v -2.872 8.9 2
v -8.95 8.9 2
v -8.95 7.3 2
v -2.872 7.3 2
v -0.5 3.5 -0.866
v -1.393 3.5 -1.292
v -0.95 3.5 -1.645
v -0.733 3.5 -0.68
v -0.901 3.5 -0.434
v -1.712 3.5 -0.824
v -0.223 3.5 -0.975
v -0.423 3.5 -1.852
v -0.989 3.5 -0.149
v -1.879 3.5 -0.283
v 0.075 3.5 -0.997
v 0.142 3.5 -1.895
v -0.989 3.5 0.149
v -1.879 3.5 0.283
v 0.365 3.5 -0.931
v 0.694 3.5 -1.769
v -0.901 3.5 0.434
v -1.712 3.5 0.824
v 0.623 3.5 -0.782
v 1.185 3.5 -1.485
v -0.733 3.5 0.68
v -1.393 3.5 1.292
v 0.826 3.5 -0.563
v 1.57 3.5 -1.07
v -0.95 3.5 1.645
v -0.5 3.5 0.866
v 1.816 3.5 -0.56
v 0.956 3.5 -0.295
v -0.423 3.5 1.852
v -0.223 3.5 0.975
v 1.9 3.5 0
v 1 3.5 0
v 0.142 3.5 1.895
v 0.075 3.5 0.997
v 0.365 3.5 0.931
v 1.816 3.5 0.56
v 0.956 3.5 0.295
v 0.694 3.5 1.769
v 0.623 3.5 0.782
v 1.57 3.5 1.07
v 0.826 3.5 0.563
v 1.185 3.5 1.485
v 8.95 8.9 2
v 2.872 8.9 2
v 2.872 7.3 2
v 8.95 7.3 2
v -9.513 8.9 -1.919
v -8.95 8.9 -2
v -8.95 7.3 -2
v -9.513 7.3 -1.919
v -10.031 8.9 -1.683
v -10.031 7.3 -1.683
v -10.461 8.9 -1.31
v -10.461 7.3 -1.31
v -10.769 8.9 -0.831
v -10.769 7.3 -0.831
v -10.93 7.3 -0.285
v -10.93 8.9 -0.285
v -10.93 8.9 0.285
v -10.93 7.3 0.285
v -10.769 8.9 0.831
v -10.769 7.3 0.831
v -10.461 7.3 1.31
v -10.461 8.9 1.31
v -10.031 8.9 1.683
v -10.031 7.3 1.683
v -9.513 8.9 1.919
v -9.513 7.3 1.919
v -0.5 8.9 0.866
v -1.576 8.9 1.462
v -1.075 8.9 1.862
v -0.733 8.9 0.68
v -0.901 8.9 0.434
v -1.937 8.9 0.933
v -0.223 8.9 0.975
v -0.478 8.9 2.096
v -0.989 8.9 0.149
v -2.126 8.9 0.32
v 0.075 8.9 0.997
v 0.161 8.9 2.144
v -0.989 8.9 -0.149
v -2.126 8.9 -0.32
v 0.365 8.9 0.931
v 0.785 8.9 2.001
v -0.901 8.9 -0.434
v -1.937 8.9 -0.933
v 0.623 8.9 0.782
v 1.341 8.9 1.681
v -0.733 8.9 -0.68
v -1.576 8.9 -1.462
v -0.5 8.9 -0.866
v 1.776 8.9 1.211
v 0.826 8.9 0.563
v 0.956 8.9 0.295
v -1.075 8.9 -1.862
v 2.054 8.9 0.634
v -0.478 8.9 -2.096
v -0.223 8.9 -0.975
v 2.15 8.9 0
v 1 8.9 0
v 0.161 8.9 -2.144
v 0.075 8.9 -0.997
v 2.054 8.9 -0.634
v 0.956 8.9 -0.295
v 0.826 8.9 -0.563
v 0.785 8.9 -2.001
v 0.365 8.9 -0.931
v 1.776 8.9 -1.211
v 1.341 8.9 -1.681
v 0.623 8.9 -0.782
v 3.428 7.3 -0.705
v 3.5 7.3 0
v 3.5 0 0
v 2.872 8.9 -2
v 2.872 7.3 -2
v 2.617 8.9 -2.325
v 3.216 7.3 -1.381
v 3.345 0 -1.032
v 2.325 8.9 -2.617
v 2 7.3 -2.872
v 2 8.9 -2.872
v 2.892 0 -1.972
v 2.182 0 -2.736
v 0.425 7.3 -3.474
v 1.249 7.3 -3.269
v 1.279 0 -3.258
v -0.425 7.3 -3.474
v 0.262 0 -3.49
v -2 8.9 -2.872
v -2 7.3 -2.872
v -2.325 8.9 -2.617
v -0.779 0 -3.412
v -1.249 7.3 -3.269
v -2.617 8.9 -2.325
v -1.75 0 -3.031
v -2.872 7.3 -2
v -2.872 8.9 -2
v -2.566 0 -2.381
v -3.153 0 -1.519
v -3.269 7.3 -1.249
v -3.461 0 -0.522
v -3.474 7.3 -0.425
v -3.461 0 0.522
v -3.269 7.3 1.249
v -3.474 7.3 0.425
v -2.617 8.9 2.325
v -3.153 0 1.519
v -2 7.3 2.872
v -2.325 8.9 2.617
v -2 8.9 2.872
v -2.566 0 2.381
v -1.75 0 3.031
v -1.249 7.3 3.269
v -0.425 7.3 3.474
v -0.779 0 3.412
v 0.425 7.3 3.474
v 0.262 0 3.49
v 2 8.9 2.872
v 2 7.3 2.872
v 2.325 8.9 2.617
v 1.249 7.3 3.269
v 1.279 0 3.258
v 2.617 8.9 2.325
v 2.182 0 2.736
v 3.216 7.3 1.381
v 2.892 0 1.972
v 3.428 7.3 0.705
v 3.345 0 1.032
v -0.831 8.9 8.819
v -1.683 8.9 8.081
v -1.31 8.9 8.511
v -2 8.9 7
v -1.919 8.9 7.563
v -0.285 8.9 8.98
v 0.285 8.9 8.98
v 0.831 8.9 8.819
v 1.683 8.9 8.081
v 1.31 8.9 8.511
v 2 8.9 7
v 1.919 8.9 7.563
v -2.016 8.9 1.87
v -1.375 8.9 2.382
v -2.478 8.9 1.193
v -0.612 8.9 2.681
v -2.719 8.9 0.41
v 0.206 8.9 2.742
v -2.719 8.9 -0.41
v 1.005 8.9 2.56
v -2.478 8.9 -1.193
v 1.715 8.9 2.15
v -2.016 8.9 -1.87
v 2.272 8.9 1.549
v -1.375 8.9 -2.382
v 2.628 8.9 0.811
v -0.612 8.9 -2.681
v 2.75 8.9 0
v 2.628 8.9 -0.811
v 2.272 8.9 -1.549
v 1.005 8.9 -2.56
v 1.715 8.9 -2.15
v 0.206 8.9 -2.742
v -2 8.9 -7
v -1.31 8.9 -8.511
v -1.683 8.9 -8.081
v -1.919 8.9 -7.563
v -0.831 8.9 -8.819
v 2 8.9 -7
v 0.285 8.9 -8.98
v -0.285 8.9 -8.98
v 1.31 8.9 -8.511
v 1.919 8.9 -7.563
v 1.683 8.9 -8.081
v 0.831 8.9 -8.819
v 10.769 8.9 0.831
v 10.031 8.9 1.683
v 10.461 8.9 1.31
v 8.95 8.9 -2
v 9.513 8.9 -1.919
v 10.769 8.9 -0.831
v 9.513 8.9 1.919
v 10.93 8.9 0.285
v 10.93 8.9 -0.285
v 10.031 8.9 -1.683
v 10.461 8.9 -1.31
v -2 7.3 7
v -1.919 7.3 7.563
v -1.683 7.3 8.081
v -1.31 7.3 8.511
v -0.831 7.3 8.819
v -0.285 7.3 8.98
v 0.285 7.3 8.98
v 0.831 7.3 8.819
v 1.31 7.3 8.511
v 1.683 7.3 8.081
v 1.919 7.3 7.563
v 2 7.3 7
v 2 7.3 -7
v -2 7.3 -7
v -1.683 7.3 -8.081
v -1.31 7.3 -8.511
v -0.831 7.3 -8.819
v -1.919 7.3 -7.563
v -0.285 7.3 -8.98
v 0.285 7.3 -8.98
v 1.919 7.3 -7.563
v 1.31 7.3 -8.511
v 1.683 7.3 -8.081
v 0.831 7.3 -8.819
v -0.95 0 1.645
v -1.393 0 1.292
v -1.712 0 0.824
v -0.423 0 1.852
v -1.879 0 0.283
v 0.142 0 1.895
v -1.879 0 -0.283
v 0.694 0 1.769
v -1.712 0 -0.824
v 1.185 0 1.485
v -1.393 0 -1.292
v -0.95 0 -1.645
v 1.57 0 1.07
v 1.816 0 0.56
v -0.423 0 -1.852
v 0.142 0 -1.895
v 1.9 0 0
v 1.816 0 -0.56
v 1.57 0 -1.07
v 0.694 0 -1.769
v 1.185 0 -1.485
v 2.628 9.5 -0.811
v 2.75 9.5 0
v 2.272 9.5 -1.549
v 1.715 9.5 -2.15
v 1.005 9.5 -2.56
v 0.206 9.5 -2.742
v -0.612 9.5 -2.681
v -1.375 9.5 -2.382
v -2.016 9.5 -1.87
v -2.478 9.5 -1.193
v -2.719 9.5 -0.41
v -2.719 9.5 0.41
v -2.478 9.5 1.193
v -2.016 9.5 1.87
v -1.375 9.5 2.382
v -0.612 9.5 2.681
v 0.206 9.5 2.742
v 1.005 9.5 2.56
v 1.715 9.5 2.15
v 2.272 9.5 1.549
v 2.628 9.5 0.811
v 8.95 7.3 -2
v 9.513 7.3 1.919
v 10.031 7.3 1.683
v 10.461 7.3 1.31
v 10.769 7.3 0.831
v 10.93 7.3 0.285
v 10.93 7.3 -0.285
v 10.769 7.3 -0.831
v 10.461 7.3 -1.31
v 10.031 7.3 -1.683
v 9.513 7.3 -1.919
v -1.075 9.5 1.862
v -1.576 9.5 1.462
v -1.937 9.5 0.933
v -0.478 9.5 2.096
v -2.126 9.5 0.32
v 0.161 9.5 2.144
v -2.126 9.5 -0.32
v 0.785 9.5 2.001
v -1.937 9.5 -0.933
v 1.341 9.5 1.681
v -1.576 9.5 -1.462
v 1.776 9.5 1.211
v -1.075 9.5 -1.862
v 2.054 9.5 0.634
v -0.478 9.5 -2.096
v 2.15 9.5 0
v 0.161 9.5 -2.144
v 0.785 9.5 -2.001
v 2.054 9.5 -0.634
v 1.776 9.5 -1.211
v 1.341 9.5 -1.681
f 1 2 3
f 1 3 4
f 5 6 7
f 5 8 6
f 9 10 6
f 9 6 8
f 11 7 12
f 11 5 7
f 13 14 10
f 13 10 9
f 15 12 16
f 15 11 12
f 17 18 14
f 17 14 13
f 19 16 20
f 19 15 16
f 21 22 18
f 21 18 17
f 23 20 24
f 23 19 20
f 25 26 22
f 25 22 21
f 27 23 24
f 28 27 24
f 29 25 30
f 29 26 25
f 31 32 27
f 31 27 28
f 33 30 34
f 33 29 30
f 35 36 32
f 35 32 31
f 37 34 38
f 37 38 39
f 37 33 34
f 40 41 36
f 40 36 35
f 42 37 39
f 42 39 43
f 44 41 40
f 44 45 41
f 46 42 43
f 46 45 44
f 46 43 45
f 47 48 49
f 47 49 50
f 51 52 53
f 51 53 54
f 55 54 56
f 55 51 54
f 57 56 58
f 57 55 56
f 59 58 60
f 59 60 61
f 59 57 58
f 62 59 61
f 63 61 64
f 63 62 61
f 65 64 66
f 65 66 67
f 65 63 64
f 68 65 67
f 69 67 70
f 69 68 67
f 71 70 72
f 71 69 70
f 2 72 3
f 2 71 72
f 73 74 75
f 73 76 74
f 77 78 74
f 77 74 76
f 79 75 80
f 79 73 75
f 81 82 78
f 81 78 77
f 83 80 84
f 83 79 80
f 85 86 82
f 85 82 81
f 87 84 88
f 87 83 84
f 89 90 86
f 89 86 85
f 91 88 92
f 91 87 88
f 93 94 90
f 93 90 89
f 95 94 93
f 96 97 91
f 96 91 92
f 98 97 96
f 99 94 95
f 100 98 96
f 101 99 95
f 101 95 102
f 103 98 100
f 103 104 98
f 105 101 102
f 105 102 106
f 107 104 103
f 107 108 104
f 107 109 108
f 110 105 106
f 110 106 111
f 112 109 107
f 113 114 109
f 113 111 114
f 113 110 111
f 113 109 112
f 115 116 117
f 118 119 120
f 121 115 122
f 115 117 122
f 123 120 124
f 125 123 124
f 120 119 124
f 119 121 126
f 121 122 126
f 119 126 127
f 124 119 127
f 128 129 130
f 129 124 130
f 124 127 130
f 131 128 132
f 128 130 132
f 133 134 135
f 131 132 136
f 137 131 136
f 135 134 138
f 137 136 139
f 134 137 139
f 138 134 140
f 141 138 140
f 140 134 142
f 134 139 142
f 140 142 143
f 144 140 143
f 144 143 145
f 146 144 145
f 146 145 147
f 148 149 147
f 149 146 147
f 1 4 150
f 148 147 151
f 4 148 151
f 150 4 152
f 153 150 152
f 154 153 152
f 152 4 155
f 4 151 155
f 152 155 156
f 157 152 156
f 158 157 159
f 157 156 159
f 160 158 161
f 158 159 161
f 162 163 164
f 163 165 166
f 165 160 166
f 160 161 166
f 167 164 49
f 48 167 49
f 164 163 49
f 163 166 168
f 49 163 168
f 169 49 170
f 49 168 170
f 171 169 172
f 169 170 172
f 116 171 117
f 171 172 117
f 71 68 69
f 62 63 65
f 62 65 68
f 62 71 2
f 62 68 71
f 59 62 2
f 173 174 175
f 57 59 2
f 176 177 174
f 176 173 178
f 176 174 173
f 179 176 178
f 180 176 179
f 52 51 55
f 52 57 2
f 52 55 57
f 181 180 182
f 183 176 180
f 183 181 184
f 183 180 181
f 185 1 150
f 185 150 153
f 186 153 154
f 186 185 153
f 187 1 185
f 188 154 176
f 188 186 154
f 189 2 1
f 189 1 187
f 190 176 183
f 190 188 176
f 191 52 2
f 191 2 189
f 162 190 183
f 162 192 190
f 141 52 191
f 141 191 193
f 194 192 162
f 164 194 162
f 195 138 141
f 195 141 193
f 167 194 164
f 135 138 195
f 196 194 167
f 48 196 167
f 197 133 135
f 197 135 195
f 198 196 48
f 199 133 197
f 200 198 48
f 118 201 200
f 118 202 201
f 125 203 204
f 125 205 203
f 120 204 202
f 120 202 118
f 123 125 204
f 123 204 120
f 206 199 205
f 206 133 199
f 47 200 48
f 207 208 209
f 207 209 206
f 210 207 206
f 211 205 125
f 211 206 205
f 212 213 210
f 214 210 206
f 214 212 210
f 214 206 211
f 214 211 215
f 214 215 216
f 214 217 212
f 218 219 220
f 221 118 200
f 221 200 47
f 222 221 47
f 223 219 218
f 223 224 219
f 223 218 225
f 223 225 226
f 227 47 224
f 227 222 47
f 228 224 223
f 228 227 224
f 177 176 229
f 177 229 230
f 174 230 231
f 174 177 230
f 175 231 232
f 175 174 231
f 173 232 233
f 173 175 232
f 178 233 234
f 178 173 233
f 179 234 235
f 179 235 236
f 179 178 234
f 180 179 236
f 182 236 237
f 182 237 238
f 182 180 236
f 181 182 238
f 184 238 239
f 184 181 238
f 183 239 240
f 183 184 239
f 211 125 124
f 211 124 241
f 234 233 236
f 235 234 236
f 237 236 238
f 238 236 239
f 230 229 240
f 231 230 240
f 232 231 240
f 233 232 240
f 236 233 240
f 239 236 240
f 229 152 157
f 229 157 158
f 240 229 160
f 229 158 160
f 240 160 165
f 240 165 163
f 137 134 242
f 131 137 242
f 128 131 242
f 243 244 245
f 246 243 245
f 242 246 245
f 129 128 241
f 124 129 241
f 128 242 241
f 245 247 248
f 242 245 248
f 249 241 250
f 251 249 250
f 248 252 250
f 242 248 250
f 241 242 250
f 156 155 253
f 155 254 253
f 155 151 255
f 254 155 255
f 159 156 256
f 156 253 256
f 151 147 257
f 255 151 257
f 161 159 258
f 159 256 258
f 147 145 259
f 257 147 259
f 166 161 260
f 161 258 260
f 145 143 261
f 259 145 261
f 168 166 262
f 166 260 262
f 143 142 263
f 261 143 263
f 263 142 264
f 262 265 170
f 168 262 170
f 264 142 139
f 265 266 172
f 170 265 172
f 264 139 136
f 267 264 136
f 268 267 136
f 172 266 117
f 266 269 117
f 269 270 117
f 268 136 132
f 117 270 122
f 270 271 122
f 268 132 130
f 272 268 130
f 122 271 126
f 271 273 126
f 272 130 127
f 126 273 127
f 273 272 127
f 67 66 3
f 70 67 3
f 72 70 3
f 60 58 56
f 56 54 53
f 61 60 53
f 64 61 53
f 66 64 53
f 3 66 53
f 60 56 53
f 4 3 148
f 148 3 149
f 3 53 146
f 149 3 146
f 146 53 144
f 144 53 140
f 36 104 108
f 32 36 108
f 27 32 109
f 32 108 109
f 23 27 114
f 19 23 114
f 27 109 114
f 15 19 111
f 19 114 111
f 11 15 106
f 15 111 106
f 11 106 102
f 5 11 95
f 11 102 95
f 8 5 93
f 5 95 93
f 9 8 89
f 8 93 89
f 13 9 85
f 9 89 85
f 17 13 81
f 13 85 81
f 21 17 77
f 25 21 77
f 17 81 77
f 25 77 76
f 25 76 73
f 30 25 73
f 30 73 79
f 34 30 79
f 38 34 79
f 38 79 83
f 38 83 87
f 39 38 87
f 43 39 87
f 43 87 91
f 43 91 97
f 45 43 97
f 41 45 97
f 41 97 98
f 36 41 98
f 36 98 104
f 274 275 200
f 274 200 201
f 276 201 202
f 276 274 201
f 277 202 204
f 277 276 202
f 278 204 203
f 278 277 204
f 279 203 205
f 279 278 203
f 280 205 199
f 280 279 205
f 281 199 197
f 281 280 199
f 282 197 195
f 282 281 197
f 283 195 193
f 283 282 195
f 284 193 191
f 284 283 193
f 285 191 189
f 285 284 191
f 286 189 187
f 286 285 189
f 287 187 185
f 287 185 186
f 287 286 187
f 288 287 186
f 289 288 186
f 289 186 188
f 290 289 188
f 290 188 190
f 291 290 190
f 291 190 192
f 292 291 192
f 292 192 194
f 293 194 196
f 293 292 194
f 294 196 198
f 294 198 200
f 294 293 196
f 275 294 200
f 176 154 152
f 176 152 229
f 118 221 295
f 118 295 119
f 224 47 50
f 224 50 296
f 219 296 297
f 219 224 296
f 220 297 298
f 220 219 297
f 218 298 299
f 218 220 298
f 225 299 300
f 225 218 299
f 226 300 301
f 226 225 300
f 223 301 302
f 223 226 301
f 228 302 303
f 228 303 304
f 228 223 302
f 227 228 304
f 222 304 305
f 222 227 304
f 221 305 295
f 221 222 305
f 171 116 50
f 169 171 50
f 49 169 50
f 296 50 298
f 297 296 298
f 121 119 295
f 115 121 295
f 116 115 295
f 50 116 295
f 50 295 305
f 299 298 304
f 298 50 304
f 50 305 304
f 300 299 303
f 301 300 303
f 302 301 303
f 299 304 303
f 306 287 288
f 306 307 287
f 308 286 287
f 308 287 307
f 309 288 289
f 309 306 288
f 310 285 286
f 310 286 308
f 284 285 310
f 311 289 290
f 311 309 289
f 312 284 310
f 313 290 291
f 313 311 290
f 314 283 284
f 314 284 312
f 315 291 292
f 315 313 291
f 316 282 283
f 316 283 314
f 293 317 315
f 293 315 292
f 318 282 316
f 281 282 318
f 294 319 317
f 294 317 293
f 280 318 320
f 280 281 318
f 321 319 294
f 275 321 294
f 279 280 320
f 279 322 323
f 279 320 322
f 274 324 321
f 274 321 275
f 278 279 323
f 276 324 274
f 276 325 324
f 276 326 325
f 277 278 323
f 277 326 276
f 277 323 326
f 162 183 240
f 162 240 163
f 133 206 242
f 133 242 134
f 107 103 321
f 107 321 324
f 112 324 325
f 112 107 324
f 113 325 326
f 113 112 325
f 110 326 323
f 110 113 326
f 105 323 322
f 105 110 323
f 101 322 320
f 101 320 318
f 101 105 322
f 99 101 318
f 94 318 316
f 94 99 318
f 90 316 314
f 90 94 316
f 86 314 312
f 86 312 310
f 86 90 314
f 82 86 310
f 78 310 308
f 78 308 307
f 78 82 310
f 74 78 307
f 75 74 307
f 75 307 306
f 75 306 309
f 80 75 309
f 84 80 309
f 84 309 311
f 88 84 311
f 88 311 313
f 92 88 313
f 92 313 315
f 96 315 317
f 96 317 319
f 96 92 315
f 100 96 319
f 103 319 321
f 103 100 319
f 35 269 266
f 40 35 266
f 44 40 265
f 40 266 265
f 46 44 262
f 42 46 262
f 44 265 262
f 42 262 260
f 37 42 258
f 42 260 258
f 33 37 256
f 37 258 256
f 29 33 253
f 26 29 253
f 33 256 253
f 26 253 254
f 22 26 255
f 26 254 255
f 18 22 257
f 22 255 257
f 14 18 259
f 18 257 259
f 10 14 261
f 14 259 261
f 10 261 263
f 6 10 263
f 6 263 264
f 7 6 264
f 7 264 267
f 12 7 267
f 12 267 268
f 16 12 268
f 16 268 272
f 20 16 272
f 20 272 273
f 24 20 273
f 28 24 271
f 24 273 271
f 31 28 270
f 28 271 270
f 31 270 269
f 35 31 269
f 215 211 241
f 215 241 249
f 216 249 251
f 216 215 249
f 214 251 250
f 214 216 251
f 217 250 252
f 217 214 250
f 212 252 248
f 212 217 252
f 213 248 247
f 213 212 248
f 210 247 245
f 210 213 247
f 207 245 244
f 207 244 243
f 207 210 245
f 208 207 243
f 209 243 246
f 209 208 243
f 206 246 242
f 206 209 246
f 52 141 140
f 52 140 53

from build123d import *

# Parameters (mm, degrees)
SZKIC1_R                    = 3.5
DODANIE_WYCI_GNI_CIE1_DEPTH = 9.5
SZKIC2_R                    = 1.9
WYTNIJ_WYCI_GNI_CIE1_DEPTH  = 3.5
SZKIC3_R                    = 2
DODANIE_WYCI_GNI_CIE2_DEPTH = 1.6
WYTNIJ_WYCI_GNI_CIE2_START  = -0.6
SZKIC4_R                    = 2.15
WYTNIJ_WYCI_GNI_CIE2_DEPTH  = 0.6
SZKIC5_R                    = 1
WYTNIJ_WYCI_GNI_CIE3_DEPTH  = 31.6
SZKIC6_R                    = 3.5
SZKIC6_R_2                  = 2.75
WYTNIJ_WYCI_GNI_CIE4_DEPTH  = 0.6


with BuildPart() as part:
    # Szkic1 → Dodanie-wyciągnięcie1 (new body)
    with BuildSketch(Plane(origin=(0, 0, 0), x_dir=(1, 0, 0), z_dir=(0, 1, 0))):
        Circle(SZKIC1_R)
    extrude(amount=DODANIE_WYCI_GNI_CIE1_DEPTH)

    # Szkic2 → Wytnij-wyciągnięcie1 (cut)
    with BuildSketch(Plane.XZ):
        Circle(SZKIC2_R)
    extrude(amount=-WYTNIJ_WYCI_GNI_CIE1_DEPTH, mode=Mode.SUBTRACT)

    # Szkic3 → Dodanie-wyciągnięcie2 (add)
    with BuildSketch(Plane(origin=(0, 8.9, 0), x_dir=(1, 0, 0), z_dir=(0, 1, 0))):
        with Locations((-8.95, 0)):
            Circle(SZKIC3_R)
        with BuildLine():
            Line((-2, 2), (-8.95, 2))
            ThreePointArc((-8.95, 2), (-7.535786438, 1.414213562), (-6.95, 0))
            ThreePointArc((-6.95, 0), (-7.535786438, -1.414213562), (-8.95, -2))
            Line((-8.95, -2), (-2, -2))
            Line((-2, -2), (-2, 2))
        make_face()
        with Locations((0, 7)):
            Circle(SZKIC3_R)
        with BuildLine():
            Line((-2, 7), (-2, 2))
            Line((-2, 2), (0, 2))
            Line((0, 2), (2, 2))
            Line((2, 2), (2, 7))
            ThreePointArc((2, 7), (0, 5), (-2, 7))
        make_face()
        with BuildLine():
            Line((8.95, 2), (2, 2))
            Line((2, 2), (2, 0))
            Line((2, 0), (2, -2))
            Line((2, -2), (8.95, -2))
            ThreePointArc((8.95, -2), (6.95, 0), (8.95, 2))
        make_face()
        with Locations((8.95, 0)):
            Circle(SZKIC3_R)
        with Locations((0, -7)):
            Circle(SZKIC3_R)
        with BuildLine():
            Line((2, -2), (-2, -2))
            Line((-2, -2), (-2, -7))
            ThreePointArc((-2, -7), (0, -5), (2, -7))
            Line((2, -7), (2, -2))
        make_face()
    extrude(amount=-DODANIE_WYCI_GNI_CIE2_DEPTH)

    # Szkic4 → Wytnij-wyciągnięcie2 (cut)
    with BuildSketch(Plane(origin=(0, 9.5, 0), x_dir=(1, 0, 0), z_dir=(0, 1, 0)).offset(WYTNIJ_WYCI_GNI_CIE2_START)):
        Circle(SZKIC4_R)
    extrude(amount=WYTNIJ_WYCI_GNI_CIE2_DEPTH, mode=Mode.SUBTRACT)

    # Szkic5 → Wytnij-wyciągnięcie3 (cut)
    with BuildSketch(Plane(origin=(0, 8.9, 0), x_dir=(1, 0, 0), z_dir=(0, 1, 0))):
        Circle(SZKIC5_R)
    extrude(amount=-WYTNIJ_WYCI_GNI_CIE3_DEPTH, mode=Mode.SUBTRACT)

    # Szkic6 → Wytnij-wyciągnięcie4 (cut)
    with BuildSketch(Plane(origin=(0, 9.5, 0), x_dir=(1, 0, 0), z_dir=(0, 1, 0))):
        Circle(SZKIC6_R)
        Circle(SZKIC6_R_2, mode=Mode.SUBTRACT)
    extrude(amount=-WYTNIJ_WYCI_GNI_CIE4_DEPTH, mode=Mode.SUBTRACT)


solid = part.part
